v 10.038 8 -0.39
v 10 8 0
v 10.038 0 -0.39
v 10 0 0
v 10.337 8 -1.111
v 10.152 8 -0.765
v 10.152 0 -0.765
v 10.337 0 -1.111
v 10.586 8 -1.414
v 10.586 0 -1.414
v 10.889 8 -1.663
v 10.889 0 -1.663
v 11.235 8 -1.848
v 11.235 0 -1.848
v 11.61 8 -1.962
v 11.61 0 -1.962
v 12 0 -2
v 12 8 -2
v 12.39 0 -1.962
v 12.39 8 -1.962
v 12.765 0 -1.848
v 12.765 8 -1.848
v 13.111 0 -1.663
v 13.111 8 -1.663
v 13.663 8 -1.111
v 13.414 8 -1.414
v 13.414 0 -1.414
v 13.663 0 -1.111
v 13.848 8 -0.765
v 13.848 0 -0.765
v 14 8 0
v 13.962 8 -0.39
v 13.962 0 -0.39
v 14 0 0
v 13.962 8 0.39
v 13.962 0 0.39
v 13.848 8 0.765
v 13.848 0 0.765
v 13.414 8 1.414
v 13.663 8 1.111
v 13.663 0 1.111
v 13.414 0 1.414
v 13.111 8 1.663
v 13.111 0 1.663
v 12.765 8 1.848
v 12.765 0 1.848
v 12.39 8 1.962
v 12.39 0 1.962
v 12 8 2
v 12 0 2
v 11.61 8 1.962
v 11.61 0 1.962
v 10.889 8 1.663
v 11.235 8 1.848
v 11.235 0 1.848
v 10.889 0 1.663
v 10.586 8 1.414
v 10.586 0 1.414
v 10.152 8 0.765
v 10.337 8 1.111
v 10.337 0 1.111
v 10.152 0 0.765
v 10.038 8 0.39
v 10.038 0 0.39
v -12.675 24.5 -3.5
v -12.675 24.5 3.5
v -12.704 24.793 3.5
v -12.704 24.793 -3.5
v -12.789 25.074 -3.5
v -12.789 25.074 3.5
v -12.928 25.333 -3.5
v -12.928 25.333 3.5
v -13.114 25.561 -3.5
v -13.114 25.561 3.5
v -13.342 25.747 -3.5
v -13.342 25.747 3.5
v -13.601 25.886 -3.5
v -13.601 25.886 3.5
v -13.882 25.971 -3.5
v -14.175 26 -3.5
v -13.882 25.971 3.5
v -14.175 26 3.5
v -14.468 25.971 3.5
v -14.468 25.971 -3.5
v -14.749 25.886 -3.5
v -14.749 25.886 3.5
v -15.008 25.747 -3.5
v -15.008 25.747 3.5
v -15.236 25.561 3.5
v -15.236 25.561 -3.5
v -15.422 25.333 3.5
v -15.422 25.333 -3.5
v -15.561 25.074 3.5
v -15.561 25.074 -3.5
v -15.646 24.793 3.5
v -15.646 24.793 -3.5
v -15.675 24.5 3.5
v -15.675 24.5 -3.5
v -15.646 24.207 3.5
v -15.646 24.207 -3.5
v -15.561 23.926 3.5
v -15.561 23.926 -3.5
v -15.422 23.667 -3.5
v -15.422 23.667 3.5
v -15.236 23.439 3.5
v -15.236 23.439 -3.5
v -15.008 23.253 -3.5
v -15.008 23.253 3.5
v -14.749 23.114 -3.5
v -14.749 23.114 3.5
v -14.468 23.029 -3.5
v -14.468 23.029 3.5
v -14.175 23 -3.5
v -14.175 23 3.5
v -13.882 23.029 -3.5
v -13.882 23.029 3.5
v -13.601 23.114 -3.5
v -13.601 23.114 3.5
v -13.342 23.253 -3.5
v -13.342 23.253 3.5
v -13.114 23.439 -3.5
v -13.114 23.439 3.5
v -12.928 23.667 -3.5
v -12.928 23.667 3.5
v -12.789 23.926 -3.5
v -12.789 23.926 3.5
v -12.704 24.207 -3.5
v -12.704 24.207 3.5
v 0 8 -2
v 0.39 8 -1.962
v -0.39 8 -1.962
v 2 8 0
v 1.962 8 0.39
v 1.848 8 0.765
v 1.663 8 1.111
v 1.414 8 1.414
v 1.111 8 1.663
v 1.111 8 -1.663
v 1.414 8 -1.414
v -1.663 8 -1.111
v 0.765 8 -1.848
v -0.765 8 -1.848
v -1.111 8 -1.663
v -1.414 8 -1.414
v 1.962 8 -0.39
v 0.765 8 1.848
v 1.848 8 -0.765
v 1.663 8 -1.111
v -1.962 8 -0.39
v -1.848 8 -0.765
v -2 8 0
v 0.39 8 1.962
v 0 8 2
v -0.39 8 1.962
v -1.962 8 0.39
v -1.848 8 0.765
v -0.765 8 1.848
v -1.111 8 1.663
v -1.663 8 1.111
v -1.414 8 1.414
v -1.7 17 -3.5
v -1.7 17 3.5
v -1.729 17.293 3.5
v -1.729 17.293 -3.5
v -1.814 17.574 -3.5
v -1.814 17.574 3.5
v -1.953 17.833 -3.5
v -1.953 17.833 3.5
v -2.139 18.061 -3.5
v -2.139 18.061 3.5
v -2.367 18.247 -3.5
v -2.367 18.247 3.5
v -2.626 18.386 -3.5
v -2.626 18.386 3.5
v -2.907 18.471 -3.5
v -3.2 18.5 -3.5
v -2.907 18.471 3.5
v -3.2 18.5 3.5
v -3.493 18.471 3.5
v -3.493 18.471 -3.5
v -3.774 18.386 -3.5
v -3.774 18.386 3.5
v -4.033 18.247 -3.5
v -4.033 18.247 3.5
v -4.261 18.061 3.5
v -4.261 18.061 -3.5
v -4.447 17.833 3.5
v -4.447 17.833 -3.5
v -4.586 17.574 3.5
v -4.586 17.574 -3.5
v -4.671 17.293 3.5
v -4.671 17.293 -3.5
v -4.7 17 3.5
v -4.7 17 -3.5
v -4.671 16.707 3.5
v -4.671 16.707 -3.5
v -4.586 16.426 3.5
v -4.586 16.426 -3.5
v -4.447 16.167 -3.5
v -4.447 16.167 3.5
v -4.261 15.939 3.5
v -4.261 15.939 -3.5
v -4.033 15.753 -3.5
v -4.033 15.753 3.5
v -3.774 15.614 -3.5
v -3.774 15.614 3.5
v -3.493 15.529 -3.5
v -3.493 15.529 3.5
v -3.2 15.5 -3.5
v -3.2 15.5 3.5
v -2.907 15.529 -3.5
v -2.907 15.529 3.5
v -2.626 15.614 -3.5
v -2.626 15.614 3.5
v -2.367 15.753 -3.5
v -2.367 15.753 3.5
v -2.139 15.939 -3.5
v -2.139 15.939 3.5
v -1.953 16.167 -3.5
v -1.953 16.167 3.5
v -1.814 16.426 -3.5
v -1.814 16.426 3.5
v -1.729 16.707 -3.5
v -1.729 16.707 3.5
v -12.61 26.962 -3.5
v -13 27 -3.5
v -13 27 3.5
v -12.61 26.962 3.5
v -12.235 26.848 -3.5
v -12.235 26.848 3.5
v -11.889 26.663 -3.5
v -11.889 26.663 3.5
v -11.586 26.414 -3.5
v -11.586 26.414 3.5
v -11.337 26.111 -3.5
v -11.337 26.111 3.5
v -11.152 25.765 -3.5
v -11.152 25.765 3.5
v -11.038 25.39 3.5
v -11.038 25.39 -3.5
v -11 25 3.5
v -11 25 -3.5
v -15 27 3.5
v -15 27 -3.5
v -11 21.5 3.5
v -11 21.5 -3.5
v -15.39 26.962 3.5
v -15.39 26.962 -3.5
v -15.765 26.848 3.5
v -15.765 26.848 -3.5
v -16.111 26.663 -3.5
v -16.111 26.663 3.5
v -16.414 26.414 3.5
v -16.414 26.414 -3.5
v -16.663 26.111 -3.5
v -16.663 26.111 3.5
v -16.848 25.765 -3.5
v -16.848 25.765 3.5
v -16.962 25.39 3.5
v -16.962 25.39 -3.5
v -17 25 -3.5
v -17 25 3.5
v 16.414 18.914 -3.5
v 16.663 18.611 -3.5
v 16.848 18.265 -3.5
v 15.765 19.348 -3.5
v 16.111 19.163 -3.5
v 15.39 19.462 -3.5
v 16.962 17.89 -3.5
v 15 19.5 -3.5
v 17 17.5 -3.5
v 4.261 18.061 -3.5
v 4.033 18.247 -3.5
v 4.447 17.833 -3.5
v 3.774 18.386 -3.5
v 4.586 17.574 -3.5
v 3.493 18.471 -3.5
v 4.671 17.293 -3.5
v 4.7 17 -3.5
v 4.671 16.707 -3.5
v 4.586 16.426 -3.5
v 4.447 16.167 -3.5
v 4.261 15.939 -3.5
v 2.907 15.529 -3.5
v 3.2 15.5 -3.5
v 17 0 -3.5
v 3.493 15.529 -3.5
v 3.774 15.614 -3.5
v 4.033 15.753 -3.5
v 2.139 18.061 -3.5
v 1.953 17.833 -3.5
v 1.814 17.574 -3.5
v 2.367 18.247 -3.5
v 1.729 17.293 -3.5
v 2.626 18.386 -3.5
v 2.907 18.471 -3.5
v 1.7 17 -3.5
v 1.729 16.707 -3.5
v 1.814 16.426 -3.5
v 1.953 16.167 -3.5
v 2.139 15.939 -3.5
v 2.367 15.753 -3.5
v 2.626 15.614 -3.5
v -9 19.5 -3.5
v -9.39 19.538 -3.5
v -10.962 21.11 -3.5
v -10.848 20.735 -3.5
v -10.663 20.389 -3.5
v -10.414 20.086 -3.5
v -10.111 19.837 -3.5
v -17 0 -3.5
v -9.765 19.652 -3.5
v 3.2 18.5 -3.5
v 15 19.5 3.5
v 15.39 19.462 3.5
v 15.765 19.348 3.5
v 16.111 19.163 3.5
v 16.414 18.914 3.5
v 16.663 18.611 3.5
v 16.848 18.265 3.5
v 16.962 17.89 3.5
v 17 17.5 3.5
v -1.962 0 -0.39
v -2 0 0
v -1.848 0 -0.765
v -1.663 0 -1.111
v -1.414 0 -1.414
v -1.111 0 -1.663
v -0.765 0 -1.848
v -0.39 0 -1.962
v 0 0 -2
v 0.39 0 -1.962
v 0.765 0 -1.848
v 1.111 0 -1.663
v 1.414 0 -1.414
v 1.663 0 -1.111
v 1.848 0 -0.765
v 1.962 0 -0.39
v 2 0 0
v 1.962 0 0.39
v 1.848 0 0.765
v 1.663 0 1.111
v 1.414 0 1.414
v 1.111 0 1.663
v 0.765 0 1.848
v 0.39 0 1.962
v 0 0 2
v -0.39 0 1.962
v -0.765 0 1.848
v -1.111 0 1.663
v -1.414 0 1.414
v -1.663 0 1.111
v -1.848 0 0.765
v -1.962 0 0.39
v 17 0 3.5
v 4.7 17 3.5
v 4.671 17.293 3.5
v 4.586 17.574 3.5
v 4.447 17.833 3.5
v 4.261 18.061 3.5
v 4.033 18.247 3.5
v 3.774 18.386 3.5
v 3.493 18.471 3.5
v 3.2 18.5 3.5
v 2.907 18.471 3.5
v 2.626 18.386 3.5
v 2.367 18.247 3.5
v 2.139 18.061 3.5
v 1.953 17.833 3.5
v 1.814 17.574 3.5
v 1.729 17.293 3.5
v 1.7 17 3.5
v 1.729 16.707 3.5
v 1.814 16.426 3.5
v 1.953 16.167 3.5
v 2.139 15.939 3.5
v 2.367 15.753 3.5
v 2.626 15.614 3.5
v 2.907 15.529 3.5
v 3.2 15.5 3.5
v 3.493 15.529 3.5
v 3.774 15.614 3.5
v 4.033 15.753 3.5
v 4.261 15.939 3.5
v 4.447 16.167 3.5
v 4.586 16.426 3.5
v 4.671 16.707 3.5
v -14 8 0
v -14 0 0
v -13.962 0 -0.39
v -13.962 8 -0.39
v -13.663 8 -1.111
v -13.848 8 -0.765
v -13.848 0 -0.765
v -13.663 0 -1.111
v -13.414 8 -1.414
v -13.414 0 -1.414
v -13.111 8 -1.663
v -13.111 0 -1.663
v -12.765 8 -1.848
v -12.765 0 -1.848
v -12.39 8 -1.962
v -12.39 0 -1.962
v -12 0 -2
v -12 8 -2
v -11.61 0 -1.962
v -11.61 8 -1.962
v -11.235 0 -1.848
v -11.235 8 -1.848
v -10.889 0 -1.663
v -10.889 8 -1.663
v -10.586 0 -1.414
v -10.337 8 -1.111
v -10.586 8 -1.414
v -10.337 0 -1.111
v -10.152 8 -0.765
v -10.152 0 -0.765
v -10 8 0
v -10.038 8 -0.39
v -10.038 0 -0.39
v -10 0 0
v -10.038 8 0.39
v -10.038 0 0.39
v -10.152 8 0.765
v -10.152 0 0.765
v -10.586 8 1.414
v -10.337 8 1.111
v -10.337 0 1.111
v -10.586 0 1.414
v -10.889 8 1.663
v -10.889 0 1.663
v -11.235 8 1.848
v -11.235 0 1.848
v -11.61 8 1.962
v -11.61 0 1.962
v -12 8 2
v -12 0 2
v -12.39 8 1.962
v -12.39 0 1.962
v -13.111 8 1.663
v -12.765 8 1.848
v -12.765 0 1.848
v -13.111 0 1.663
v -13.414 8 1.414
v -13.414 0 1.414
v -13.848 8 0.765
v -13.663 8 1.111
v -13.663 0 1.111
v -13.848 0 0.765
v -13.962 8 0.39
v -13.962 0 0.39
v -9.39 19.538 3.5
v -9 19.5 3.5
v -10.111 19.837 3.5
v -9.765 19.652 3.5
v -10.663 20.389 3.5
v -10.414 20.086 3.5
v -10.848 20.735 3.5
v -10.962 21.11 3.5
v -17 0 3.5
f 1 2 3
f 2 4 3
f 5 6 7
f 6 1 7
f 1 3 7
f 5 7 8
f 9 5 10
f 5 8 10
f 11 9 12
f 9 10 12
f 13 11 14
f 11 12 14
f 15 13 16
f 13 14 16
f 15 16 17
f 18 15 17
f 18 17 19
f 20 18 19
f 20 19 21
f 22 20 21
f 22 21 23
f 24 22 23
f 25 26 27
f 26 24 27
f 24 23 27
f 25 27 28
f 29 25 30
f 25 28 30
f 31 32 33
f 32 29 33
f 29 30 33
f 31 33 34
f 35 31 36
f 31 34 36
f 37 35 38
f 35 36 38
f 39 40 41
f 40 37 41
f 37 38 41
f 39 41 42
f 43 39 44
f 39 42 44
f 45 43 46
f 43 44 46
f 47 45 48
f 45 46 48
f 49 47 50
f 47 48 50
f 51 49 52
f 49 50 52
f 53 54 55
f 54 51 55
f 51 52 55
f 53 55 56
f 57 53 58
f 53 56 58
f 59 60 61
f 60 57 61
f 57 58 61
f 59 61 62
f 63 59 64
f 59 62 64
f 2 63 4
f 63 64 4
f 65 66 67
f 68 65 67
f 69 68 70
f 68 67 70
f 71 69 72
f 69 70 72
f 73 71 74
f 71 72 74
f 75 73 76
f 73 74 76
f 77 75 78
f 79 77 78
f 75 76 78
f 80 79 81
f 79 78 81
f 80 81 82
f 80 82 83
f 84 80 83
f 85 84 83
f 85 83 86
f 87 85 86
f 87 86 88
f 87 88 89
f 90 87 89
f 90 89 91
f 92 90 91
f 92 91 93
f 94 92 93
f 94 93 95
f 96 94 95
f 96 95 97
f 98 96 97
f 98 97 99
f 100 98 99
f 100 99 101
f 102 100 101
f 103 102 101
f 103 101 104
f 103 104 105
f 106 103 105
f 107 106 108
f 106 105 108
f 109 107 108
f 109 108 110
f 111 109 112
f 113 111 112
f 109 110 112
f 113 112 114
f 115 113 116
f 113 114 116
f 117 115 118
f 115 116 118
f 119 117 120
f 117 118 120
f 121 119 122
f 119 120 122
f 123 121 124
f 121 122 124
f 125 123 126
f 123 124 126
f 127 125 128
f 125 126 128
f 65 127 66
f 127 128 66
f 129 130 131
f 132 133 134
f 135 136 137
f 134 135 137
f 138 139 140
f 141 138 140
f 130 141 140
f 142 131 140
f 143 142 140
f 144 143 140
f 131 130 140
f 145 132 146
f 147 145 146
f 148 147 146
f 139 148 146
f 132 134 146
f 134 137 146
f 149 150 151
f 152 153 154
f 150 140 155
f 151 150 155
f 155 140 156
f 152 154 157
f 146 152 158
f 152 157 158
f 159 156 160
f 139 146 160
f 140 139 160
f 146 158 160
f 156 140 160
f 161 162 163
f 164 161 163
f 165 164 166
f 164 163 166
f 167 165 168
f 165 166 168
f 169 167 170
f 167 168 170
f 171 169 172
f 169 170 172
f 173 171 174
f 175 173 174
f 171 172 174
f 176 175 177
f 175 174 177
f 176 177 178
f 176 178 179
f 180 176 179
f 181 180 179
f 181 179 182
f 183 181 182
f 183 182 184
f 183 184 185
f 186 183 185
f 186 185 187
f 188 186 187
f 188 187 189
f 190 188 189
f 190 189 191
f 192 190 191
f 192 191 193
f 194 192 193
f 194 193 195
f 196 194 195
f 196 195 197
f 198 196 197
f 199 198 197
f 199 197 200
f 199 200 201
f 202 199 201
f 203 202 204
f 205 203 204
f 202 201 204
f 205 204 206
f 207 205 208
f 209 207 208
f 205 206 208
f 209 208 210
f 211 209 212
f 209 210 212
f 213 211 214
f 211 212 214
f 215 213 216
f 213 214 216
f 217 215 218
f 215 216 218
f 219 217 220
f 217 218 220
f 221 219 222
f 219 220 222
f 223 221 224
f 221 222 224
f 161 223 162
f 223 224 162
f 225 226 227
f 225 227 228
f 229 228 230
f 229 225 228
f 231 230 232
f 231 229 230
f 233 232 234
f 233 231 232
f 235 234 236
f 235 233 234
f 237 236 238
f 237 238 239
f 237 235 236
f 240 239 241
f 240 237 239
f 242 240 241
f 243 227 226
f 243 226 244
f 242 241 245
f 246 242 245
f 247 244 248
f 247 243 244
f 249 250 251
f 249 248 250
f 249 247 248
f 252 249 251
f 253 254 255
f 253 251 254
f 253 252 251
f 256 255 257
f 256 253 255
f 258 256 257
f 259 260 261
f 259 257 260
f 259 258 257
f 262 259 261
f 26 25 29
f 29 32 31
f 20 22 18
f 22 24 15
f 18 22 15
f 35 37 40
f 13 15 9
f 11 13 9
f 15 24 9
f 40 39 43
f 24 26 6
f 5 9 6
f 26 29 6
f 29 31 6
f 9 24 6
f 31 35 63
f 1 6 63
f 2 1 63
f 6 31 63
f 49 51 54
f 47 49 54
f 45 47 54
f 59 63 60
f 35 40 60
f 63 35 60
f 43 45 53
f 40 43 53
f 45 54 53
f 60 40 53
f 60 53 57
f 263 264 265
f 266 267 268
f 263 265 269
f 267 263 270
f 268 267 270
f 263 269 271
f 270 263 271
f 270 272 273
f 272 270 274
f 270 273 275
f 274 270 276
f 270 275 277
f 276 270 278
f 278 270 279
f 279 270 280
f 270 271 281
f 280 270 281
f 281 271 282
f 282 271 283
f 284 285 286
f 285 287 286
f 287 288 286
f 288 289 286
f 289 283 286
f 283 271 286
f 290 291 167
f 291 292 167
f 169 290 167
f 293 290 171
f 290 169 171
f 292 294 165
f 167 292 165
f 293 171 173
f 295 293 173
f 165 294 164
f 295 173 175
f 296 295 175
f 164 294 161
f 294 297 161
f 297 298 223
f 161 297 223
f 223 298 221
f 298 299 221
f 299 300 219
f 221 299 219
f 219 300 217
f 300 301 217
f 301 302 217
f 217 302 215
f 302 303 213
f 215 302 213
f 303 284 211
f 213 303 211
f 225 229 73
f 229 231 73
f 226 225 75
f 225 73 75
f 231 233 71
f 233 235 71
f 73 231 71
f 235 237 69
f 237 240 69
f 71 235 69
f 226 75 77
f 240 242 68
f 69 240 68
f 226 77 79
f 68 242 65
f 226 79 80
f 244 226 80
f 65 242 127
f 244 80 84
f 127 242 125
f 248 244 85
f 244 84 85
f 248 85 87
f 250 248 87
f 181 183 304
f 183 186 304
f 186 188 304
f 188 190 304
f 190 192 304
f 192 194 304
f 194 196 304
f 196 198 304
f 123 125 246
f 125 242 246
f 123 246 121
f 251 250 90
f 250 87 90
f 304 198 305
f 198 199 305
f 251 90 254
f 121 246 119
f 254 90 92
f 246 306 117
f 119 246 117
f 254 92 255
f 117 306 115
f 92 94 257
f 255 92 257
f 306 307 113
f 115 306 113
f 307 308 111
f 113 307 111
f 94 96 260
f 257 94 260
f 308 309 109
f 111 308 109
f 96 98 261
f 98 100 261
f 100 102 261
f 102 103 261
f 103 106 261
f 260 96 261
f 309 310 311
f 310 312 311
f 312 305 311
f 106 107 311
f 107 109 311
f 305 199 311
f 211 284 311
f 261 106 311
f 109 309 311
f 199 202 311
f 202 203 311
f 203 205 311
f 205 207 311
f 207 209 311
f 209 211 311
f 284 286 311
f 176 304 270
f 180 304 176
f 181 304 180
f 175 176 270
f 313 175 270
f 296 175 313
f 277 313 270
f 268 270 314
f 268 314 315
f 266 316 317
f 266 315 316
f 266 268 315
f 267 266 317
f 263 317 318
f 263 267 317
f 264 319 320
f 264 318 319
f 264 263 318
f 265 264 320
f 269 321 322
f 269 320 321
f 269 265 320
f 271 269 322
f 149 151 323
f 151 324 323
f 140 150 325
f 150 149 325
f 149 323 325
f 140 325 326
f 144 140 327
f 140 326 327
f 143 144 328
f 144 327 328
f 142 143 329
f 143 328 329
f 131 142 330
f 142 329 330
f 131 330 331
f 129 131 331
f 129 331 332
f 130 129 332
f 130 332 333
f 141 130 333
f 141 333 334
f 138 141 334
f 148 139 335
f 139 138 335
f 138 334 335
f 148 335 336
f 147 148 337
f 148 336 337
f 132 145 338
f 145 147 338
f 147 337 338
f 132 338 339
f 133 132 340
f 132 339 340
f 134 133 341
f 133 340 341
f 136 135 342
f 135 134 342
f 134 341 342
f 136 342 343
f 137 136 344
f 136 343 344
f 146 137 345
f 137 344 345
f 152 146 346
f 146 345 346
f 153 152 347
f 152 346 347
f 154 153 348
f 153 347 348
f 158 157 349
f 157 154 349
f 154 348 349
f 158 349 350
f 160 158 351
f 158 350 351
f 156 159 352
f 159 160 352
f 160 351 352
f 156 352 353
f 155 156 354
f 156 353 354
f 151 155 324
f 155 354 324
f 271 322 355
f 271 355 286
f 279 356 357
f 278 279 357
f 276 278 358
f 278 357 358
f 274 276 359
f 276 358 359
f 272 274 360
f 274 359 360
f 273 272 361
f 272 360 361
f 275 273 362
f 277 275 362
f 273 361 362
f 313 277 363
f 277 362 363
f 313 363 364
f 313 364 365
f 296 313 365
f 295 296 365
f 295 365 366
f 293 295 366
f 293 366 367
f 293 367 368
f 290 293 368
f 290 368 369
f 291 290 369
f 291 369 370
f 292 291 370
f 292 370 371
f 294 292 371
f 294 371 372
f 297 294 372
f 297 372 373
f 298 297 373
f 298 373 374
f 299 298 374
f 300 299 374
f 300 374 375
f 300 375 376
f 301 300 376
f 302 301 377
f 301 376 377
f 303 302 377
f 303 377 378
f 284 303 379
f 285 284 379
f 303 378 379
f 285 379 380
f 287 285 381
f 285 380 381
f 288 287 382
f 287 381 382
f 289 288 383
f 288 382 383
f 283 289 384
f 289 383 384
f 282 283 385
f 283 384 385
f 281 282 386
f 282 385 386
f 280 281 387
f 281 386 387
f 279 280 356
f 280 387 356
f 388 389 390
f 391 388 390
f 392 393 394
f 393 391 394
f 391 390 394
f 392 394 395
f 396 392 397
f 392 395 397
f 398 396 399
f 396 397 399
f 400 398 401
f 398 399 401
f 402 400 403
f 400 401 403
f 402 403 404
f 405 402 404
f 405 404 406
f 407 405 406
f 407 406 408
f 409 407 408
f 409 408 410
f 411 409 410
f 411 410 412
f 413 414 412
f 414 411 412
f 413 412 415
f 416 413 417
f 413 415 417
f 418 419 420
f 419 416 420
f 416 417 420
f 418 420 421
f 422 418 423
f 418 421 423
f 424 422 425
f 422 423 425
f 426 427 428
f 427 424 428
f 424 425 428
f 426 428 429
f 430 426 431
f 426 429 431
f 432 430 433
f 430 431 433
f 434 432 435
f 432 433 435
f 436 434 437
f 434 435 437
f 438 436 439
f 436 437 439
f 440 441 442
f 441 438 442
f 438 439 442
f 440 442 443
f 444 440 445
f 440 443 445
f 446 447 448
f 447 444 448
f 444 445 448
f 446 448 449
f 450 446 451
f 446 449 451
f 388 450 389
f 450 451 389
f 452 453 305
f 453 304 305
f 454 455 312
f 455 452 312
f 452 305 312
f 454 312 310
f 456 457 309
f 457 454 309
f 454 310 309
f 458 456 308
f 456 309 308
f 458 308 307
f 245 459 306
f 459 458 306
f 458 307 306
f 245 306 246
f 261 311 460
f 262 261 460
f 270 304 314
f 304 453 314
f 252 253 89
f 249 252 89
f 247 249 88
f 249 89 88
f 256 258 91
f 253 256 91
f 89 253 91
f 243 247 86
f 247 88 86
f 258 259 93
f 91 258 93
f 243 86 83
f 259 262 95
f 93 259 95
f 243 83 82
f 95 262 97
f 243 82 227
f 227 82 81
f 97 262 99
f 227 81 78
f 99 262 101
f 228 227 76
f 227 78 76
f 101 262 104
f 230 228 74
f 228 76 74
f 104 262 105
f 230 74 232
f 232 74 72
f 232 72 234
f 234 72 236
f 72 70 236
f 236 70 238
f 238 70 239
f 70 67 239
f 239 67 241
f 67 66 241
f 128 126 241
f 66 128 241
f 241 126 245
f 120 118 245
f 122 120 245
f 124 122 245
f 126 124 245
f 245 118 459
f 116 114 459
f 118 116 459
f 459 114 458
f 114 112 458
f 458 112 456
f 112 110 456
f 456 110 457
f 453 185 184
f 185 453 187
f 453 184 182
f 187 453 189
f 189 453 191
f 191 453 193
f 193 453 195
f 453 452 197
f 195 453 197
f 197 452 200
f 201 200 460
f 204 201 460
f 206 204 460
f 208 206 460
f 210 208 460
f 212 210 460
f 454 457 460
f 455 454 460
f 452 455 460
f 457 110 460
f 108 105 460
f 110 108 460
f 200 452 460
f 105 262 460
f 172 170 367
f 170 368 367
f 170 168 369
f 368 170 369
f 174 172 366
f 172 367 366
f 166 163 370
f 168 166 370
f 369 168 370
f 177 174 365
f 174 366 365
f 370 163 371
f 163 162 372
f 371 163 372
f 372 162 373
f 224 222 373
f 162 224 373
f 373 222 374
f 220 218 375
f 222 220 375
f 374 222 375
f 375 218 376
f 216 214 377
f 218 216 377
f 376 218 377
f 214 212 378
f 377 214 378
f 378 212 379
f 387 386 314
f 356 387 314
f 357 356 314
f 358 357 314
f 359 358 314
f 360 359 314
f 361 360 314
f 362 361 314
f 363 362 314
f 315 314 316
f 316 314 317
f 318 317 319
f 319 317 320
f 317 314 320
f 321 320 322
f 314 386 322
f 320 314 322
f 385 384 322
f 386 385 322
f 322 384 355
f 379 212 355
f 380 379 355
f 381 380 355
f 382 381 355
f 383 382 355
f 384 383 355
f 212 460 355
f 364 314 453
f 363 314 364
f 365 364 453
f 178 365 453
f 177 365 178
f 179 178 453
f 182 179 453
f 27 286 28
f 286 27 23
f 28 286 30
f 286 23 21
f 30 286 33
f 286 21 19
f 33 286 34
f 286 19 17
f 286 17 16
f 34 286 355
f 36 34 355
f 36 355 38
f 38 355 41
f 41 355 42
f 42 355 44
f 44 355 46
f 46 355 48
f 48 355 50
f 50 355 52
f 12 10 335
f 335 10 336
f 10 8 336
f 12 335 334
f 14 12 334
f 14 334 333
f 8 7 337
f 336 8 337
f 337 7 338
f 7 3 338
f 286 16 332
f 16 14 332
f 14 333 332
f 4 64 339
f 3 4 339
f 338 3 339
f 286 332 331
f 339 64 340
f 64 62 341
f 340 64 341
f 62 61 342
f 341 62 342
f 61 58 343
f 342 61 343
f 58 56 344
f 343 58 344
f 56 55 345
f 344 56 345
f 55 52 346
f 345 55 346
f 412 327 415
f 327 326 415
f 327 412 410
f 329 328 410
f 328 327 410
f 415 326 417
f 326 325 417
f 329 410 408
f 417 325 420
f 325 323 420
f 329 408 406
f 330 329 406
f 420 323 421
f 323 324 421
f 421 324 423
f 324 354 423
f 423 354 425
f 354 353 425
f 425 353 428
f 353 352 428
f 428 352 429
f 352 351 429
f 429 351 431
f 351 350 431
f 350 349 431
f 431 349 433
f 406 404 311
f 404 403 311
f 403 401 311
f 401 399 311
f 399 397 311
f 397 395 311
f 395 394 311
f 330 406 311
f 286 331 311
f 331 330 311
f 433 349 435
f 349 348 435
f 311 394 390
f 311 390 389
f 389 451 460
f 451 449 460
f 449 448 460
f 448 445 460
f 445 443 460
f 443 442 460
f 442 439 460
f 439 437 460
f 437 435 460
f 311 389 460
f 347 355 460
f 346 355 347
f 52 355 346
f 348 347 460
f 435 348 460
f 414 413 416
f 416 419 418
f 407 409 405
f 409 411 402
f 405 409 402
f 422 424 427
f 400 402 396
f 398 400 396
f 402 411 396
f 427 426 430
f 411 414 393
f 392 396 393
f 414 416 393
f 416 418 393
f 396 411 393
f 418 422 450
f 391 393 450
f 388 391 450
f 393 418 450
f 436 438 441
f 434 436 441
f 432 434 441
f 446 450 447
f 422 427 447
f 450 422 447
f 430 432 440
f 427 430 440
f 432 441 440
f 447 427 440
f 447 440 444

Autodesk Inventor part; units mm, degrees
ref_plane "YZ Plane" through (0, 0, 0) normal (1, 0, 0) x (0, 1, 0)
ref_plane "XZ Plane" through (0, 0, 0) normal (0, 1, 0) x (-1, 0, 0)
ref_plane "XY Plane" through (0, 0, 0) normal (0, 0, 1) x (1, 0, 0)
sketch "Sketch1" plane through (0, 0, 0) normal (0, 1, 0) x (-1, 0, 0)
  circle A0 centre (0, 0) radius 2
  circle A1 centre (12, 0) radius 2
  line L0 (0, 0) -> (0, 2) construction
  circle A2 centre (-12, 0) radius 2
  line L1 (17, 3.5) -> (-17, 3.5)
  line L2 (-17, 3.5) -> (-17, -3.5)
  line L3 (-17, -3.5) -> (17, -3.5)
  line L4 (17, -3.5) -> (17, 3.5)
  line L5 (17, 3.5) -> (-17, -3.5) construction
  line L6 (-17, 3.5) -> (17, -3.5) construction
  dimension "d0" = 4
  dimension "d1" = 4
  dimension "d2" = 12
  dimension "d3" = 34
  dimension "d4" = 7
extrude "Extrusion1" add sketch "Sketch1" along normal blind 27 contours A0 | A1 | A2 | L4 L3 L2 L1
extrude "Extrusion2" cut sketch "Sketch1" along normal blind 8 contours A0 | A1 | A2
sketch "Sketch2" plane through (-17, 0, 3.5) normal (0, 0, 1) x (1, 0, 0)
  circle A0 centre (20.2, 17) radius 1.5
  circle A1 centre (13.8, 17) radius 1.5
  circle A2 centre (2.825, 24.5) radius 1.5
  line L0 (13.8, 17) -> (20.2, 17) construction
  line L1 (0, 0) -> (34, 0) projected
  line L2 (0, 27) -> (34, 27) construction
  point P0 (17, 0)
  point P1 (17, 17)
  point P2 (17, 0)
  point P3 (17, 27)
  dimension "d9" = 3
  dimension "d10" = 3
  dimension "d11" = 3
  dimension "d12" = 6.4
  dimension "d13" = 10.975
  dimension "d14" = 7.5
  dimension "d15" = 10
extrude "Extrusion3" cut sketch "Sketch2" against normal through all
sketch "Sketch3" plane through (-17, 0, 3.5) normal (0, 0, 1) x (1, 0, 0)
  line L0 (34, 27) -> (0, 27) projected
  line L1 (6, 27) -> (6, 19.5)
  line L2 (6, 19.5) -> (34, 19.5)
  line L3 (34, 0) -> (34, 27) projected
  point P0 (17, 0)
  dimension "d18" = 7.5
  dimension "d19" = 28
extrude "Extrusion4" cut sketch "Sketch3" against normal through all
fillet "Fillet1" radius 2 4 edges at (-17, 27, 0) (-11, 27, 0) (-11, 19.5, 0) (17, 19.5, 0)
properties part number "Pixy2Mount" material "PC/ABS Plastic"
